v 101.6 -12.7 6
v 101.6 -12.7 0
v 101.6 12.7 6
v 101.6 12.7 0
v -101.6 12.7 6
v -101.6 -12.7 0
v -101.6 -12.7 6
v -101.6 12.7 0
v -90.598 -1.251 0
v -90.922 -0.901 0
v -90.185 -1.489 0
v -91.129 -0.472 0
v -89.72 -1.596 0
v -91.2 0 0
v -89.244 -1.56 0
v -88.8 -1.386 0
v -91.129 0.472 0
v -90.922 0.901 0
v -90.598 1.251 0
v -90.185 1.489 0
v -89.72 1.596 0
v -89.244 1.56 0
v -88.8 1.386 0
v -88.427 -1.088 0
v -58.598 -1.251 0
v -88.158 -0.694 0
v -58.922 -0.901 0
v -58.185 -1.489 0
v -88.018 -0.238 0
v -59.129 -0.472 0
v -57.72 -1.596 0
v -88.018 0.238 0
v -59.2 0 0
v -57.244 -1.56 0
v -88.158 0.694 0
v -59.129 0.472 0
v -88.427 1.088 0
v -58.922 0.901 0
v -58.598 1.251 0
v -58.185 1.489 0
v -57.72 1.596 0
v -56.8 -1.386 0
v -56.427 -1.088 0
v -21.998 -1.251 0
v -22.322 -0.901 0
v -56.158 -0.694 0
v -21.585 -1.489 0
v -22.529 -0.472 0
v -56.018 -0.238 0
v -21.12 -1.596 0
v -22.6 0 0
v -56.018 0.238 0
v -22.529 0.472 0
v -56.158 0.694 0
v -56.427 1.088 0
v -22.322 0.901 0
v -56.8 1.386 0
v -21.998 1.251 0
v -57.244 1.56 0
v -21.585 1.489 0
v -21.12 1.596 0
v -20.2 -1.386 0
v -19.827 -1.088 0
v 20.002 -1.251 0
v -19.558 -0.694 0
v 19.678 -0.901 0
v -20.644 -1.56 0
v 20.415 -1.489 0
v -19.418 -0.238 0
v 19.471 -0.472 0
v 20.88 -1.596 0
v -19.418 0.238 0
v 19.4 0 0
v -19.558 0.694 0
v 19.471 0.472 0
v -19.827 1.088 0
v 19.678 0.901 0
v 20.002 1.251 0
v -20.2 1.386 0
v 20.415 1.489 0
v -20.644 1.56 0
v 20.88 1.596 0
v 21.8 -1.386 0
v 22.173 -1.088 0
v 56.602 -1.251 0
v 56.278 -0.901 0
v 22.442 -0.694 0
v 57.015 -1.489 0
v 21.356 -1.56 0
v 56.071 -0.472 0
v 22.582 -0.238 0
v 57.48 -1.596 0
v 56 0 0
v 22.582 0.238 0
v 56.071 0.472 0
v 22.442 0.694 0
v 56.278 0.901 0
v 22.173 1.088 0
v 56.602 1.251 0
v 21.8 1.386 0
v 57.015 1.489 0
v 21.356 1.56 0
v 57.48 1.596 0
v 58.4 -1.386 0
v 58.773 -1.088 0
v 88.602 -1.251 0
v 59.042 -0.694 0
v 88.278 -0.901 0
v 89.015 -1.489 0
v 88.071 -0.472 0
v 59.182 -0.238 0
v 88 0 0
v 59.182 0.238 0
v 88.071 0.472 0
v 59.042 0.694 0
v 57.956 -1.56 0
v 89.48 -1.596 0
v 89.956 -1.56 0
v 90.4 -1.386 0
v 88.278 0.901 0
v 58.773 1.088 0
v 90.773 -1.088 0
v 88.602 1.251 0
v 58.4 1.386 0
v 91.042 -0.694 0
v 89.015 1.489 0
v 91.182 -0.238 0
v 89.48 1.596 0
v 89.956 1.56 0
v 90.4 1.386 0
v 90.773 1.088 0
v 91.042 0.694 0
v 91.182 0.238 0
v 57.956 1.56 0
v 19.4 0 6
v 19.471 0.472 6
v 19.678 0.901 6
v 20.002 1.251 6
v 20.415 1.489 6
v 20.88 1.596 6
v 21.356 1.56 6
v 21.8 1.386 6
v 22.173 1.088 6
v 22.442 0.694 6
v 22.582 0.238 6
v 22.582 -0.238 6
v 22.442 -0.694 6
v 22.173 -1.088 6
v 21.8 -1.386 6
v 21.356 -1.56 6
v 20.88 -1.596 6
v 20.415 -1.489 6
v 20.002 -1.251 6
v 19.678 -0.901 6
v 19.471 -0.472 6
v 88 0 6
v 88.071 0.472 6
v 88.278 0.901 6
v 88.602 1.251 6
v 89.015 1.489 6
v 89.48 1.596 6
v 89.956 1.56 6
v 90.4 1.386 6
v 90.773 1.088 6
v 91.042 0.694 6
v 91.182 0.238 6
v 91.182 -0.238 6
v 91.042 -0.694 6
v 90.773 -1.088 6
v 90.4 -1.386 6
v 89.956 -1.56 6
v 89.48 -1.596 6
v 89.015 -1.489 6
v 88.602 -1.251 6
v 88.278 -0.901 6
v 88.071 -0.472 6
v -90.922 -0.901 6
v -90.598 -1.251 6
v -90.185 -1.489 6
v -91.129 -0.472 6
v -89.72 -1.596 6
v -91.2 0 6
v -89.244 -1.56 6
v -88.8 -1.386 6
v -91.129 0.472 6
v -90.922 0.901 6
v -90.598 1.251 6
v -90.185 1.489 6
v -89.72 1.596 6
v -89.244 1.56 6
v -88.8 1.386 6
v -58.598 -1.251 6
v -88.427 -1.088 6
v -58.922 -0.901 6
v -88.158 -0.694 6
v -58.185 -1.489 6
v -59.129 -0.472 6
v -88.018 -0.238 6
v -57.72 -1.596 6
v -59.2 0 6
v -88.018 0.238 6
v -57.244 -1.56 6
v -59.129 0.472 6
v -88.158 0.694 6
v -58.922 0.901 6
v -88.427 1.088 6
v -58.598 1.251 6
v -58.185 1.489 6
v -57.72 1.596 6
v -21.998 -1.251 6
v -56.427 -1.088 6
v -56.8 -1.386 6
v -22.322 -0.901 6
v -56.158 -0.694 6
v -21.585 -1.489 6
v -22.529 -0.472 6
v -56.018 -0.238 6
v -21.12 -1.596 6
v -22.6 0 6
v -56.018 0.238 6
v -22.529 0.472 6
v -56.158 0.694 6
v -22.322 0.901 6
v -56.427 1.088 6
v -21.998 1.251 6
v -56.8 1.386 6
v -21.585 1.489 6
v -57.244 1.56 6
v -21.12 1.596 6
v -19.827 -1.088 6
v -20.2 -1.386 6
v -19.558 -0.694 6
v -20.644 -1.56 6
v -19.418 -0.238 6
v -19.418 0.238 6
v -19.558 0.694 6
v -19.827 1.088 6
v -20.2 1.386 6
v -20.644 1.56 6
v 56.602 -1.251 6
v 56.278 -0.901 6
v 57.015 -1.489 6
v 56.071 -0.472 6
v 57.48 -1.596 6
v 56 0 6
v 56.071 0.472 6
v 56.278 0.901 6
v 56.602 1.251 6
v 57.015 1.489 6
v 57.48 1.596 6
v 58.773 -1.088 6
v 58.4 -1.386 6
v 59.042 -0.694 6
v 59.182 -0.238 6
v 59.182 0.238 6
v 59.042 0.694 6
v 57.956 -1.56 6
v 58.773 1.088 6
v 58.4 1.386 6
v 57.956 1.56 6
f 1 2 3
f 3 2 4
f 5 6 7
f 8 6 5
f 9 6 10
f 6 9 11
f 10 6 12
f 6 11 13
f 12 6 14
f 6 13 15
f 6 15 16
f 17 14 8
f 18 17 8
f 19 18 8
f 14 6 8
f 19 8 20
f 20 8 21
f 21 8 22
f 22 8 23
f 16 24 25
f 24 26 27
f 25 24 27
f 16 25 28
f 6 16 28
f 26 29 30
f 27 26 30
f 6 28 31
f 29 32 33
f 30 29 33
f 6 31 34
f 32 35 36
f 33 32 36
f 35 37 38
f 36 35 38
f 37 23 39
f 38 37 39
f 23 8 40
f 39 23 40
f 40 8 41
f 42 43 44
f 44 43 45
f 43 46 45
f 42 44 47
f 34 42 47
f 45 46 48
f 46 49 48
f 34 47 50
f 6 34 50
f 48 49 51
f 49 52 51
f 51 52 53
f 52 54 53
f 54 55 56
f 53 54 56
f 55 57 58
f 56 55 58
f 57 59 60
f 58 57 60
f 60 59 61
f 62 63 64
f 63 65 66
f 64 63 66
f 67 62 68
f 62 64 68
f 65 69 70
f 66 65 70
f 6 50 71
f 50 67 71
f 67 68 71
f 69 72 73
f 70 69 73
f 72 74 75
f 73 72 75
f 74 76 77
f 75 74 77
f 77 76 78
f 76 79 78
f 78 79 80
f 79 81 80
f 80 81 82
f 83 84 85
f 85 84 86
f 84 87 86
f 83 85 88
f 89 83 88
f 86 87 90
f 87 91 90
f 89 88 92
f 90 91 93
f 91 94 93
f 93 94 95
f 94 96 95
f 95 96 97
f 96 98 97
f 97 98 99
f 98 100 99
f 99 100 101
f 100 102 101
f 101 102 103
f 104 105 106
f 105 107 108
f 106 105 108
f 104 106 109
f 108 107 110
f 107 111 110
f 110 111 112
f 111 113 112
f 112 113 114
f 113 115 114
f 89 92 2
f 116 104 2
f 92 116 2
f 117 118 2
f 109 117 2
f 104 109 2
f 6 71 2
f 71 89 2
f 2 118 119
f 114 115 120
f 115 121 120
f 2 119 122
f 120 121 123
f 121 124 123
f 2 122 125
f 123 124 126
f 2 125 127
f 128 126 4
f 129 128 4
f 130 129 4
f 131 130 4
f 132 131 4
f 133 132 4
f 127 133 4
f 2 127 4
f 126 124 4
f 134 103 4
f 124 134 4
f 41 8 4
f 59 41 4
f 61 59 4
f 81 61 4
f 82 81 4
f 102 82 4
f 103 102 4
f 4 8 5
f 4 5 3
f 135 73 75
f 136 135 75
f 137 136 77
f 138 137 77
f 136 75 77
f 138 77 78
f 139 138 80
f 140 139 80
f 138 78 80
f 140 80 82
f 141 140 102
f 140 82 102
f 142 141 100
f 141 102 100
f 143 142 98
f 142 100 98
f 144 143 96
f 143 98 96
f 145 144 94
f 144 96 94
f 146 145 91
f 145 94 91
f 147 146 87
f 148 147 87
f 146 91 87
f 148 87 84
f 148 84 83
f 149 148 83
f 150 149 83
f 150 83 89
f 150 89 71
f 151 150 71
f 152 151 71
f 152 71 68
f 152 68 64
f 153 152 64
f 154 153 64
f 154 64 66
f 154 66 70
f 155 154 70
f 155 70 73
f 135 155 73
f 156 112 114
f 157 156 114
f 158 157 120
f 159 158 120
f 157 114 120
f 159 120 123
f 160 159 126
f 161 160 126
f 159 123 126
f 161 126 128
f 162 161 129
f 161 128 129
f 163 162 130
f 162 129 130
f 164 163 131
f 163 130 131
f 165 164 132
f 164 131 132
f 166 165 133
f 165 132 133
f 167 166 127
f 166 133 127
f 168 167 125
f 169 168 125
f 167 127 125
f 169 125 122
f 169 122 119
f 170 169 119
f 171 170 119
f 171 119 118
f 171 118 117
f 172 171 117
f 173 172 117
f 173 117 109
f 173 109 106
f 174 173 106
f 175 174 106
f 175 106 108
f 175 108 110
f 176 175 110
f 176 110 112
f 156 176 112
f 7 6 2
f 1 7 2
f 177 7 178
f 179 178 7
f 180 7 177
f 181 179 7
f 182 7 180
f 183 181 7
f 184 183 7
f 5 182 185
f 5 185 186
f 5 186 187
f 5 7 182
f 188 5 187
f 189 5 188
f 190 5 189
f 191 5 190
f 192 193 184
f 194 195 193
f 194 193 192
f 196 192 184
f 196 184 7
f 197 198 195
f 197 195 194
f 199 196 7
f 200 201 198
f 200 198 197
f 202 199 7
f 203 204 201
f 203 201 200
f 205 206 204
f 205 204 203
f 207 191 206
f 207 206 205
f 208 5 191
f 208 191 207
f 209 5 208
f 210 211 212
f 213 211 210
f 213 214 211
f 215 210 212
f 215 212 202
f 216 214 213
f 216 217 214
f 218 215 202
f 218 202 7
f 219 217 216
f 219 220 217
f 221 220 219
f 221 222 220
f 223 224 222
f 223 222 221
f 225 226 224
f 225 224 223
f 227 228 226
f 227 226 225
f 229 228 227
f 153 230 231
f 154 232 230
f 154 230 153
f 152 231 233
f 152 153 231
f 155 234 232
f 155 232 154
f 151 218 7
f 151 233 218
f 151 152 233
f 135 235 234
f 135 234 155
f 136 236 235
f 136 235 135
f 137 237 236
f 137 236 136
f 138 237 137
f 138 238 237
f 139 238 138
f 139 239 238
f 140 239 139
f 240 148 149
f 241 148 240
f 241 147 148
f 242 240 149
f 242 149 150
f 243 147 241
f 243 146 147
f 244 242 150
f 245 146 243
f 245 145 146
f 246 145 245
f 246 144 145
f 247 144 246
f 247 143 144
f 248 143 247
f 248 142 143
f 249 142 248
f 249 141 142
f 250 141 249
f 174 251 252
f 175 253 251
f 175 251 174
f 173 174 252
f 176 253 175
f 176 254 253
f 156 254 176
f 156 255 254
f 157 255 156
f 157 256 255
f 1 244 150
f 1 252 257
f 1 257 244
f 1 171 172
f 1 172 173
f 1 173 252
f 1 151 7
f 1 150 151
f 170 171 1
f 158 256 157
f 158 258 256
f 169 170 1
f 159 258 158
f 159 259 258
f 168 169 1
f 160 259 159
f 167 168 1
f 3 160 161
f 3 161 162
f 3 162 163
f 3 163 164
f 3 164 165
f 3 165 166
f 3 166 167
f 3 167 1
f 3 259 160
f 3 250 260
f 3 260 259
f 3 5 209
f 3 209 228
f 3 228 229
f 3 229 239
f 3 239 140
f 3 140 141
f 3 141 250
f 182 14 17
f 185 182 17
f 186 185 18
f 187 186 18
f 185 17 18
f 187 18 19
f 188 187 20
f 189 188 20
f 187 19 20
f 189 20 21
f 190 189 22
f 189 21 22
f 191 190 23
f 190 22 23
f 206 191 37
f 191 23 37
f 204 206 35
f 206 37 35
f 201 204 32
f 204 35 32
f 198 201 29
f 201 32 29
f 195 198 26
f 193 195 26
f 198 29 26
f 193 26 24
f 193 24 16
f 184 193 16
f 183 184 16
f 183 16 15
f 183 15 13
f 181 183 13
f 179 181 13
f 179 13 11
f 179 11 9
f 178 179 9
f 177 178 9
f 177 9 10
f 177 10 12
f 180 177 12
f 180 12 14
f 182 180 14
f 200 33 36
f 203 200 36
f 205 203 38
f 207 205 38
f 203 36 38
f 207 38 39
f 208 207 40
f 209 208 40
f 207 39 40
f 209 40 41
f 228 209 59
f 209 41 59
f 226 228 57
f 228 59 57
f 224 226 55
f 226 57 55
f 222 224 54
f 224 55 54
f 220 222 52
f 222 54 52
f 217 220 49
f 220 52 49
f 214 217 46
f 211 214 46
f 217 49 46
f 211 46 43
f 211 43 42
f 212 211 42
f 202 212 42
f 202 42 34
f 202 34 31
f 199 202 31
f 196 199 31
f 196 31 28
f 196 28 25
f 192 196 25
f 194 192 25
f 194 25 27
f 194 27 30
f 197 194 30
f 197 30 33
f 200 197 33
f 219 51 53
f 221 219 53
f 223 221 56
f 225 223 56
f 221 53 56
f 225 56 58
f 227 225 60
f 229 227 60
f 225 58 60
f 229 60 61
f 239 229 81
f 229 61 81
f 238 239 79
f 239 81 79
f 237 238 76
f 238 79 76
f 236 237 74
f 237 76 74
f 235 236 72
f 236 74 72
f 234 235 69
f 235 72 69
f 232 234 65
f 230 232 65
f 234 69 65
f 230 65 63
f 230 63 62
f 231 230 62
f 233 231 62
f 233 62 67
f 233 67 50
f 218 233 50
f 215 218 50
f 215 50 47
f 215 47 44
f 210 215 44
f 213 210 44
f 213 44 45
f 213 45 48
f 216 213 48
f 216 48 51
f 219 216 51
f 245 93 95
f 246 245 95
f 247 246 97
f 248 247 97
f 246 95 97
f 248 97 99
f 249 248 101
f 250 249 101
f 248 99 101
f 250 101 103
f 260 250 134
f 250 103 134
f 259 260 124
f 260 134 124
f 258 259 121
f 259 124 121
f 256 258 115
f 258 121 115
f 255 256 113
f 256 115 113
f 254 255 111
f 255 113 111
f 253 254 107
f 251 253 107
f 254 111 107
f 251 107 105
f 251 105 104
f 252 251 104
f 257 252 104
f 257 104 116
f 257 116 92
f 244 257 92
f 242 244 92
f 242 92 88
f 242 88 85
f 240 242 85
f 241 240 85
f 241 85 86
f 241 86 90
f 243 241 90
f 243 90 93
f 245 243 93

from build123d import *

# Parameters (mm, degrees)
ESQUISSE1_W        = 203.2
ESQUISSE1_H        = 25.4
BOSS_EXTRU_1_DEPTH = 6
D_GAGEMENT_M31_D   = 3.2


with BuildPart() as part:
    # Esquisse1 → Boss.-Extru.1 (new body)
    with BuildSketch(Plane.XY):
        Rectangle(ESQUISSE1_W, ESQUISSE1_H)
    extrude(amount=BOSS_EXTRU_1_DEPTH)

    # Dégagement M31 (through all)
    with Locations(Plane(origin=(89.6, 0, 6), x_dir=(1, 0, 0), z_dir=(0, 0, 1))):
        with Locations((0, 0), (-32, 0), (-68.6, 0), (-110.6, 0), (-147.2, 0), (-179.2, 0)):
            Hole(D_GAGEMENT_M31_D / 2)


solid = part.part
